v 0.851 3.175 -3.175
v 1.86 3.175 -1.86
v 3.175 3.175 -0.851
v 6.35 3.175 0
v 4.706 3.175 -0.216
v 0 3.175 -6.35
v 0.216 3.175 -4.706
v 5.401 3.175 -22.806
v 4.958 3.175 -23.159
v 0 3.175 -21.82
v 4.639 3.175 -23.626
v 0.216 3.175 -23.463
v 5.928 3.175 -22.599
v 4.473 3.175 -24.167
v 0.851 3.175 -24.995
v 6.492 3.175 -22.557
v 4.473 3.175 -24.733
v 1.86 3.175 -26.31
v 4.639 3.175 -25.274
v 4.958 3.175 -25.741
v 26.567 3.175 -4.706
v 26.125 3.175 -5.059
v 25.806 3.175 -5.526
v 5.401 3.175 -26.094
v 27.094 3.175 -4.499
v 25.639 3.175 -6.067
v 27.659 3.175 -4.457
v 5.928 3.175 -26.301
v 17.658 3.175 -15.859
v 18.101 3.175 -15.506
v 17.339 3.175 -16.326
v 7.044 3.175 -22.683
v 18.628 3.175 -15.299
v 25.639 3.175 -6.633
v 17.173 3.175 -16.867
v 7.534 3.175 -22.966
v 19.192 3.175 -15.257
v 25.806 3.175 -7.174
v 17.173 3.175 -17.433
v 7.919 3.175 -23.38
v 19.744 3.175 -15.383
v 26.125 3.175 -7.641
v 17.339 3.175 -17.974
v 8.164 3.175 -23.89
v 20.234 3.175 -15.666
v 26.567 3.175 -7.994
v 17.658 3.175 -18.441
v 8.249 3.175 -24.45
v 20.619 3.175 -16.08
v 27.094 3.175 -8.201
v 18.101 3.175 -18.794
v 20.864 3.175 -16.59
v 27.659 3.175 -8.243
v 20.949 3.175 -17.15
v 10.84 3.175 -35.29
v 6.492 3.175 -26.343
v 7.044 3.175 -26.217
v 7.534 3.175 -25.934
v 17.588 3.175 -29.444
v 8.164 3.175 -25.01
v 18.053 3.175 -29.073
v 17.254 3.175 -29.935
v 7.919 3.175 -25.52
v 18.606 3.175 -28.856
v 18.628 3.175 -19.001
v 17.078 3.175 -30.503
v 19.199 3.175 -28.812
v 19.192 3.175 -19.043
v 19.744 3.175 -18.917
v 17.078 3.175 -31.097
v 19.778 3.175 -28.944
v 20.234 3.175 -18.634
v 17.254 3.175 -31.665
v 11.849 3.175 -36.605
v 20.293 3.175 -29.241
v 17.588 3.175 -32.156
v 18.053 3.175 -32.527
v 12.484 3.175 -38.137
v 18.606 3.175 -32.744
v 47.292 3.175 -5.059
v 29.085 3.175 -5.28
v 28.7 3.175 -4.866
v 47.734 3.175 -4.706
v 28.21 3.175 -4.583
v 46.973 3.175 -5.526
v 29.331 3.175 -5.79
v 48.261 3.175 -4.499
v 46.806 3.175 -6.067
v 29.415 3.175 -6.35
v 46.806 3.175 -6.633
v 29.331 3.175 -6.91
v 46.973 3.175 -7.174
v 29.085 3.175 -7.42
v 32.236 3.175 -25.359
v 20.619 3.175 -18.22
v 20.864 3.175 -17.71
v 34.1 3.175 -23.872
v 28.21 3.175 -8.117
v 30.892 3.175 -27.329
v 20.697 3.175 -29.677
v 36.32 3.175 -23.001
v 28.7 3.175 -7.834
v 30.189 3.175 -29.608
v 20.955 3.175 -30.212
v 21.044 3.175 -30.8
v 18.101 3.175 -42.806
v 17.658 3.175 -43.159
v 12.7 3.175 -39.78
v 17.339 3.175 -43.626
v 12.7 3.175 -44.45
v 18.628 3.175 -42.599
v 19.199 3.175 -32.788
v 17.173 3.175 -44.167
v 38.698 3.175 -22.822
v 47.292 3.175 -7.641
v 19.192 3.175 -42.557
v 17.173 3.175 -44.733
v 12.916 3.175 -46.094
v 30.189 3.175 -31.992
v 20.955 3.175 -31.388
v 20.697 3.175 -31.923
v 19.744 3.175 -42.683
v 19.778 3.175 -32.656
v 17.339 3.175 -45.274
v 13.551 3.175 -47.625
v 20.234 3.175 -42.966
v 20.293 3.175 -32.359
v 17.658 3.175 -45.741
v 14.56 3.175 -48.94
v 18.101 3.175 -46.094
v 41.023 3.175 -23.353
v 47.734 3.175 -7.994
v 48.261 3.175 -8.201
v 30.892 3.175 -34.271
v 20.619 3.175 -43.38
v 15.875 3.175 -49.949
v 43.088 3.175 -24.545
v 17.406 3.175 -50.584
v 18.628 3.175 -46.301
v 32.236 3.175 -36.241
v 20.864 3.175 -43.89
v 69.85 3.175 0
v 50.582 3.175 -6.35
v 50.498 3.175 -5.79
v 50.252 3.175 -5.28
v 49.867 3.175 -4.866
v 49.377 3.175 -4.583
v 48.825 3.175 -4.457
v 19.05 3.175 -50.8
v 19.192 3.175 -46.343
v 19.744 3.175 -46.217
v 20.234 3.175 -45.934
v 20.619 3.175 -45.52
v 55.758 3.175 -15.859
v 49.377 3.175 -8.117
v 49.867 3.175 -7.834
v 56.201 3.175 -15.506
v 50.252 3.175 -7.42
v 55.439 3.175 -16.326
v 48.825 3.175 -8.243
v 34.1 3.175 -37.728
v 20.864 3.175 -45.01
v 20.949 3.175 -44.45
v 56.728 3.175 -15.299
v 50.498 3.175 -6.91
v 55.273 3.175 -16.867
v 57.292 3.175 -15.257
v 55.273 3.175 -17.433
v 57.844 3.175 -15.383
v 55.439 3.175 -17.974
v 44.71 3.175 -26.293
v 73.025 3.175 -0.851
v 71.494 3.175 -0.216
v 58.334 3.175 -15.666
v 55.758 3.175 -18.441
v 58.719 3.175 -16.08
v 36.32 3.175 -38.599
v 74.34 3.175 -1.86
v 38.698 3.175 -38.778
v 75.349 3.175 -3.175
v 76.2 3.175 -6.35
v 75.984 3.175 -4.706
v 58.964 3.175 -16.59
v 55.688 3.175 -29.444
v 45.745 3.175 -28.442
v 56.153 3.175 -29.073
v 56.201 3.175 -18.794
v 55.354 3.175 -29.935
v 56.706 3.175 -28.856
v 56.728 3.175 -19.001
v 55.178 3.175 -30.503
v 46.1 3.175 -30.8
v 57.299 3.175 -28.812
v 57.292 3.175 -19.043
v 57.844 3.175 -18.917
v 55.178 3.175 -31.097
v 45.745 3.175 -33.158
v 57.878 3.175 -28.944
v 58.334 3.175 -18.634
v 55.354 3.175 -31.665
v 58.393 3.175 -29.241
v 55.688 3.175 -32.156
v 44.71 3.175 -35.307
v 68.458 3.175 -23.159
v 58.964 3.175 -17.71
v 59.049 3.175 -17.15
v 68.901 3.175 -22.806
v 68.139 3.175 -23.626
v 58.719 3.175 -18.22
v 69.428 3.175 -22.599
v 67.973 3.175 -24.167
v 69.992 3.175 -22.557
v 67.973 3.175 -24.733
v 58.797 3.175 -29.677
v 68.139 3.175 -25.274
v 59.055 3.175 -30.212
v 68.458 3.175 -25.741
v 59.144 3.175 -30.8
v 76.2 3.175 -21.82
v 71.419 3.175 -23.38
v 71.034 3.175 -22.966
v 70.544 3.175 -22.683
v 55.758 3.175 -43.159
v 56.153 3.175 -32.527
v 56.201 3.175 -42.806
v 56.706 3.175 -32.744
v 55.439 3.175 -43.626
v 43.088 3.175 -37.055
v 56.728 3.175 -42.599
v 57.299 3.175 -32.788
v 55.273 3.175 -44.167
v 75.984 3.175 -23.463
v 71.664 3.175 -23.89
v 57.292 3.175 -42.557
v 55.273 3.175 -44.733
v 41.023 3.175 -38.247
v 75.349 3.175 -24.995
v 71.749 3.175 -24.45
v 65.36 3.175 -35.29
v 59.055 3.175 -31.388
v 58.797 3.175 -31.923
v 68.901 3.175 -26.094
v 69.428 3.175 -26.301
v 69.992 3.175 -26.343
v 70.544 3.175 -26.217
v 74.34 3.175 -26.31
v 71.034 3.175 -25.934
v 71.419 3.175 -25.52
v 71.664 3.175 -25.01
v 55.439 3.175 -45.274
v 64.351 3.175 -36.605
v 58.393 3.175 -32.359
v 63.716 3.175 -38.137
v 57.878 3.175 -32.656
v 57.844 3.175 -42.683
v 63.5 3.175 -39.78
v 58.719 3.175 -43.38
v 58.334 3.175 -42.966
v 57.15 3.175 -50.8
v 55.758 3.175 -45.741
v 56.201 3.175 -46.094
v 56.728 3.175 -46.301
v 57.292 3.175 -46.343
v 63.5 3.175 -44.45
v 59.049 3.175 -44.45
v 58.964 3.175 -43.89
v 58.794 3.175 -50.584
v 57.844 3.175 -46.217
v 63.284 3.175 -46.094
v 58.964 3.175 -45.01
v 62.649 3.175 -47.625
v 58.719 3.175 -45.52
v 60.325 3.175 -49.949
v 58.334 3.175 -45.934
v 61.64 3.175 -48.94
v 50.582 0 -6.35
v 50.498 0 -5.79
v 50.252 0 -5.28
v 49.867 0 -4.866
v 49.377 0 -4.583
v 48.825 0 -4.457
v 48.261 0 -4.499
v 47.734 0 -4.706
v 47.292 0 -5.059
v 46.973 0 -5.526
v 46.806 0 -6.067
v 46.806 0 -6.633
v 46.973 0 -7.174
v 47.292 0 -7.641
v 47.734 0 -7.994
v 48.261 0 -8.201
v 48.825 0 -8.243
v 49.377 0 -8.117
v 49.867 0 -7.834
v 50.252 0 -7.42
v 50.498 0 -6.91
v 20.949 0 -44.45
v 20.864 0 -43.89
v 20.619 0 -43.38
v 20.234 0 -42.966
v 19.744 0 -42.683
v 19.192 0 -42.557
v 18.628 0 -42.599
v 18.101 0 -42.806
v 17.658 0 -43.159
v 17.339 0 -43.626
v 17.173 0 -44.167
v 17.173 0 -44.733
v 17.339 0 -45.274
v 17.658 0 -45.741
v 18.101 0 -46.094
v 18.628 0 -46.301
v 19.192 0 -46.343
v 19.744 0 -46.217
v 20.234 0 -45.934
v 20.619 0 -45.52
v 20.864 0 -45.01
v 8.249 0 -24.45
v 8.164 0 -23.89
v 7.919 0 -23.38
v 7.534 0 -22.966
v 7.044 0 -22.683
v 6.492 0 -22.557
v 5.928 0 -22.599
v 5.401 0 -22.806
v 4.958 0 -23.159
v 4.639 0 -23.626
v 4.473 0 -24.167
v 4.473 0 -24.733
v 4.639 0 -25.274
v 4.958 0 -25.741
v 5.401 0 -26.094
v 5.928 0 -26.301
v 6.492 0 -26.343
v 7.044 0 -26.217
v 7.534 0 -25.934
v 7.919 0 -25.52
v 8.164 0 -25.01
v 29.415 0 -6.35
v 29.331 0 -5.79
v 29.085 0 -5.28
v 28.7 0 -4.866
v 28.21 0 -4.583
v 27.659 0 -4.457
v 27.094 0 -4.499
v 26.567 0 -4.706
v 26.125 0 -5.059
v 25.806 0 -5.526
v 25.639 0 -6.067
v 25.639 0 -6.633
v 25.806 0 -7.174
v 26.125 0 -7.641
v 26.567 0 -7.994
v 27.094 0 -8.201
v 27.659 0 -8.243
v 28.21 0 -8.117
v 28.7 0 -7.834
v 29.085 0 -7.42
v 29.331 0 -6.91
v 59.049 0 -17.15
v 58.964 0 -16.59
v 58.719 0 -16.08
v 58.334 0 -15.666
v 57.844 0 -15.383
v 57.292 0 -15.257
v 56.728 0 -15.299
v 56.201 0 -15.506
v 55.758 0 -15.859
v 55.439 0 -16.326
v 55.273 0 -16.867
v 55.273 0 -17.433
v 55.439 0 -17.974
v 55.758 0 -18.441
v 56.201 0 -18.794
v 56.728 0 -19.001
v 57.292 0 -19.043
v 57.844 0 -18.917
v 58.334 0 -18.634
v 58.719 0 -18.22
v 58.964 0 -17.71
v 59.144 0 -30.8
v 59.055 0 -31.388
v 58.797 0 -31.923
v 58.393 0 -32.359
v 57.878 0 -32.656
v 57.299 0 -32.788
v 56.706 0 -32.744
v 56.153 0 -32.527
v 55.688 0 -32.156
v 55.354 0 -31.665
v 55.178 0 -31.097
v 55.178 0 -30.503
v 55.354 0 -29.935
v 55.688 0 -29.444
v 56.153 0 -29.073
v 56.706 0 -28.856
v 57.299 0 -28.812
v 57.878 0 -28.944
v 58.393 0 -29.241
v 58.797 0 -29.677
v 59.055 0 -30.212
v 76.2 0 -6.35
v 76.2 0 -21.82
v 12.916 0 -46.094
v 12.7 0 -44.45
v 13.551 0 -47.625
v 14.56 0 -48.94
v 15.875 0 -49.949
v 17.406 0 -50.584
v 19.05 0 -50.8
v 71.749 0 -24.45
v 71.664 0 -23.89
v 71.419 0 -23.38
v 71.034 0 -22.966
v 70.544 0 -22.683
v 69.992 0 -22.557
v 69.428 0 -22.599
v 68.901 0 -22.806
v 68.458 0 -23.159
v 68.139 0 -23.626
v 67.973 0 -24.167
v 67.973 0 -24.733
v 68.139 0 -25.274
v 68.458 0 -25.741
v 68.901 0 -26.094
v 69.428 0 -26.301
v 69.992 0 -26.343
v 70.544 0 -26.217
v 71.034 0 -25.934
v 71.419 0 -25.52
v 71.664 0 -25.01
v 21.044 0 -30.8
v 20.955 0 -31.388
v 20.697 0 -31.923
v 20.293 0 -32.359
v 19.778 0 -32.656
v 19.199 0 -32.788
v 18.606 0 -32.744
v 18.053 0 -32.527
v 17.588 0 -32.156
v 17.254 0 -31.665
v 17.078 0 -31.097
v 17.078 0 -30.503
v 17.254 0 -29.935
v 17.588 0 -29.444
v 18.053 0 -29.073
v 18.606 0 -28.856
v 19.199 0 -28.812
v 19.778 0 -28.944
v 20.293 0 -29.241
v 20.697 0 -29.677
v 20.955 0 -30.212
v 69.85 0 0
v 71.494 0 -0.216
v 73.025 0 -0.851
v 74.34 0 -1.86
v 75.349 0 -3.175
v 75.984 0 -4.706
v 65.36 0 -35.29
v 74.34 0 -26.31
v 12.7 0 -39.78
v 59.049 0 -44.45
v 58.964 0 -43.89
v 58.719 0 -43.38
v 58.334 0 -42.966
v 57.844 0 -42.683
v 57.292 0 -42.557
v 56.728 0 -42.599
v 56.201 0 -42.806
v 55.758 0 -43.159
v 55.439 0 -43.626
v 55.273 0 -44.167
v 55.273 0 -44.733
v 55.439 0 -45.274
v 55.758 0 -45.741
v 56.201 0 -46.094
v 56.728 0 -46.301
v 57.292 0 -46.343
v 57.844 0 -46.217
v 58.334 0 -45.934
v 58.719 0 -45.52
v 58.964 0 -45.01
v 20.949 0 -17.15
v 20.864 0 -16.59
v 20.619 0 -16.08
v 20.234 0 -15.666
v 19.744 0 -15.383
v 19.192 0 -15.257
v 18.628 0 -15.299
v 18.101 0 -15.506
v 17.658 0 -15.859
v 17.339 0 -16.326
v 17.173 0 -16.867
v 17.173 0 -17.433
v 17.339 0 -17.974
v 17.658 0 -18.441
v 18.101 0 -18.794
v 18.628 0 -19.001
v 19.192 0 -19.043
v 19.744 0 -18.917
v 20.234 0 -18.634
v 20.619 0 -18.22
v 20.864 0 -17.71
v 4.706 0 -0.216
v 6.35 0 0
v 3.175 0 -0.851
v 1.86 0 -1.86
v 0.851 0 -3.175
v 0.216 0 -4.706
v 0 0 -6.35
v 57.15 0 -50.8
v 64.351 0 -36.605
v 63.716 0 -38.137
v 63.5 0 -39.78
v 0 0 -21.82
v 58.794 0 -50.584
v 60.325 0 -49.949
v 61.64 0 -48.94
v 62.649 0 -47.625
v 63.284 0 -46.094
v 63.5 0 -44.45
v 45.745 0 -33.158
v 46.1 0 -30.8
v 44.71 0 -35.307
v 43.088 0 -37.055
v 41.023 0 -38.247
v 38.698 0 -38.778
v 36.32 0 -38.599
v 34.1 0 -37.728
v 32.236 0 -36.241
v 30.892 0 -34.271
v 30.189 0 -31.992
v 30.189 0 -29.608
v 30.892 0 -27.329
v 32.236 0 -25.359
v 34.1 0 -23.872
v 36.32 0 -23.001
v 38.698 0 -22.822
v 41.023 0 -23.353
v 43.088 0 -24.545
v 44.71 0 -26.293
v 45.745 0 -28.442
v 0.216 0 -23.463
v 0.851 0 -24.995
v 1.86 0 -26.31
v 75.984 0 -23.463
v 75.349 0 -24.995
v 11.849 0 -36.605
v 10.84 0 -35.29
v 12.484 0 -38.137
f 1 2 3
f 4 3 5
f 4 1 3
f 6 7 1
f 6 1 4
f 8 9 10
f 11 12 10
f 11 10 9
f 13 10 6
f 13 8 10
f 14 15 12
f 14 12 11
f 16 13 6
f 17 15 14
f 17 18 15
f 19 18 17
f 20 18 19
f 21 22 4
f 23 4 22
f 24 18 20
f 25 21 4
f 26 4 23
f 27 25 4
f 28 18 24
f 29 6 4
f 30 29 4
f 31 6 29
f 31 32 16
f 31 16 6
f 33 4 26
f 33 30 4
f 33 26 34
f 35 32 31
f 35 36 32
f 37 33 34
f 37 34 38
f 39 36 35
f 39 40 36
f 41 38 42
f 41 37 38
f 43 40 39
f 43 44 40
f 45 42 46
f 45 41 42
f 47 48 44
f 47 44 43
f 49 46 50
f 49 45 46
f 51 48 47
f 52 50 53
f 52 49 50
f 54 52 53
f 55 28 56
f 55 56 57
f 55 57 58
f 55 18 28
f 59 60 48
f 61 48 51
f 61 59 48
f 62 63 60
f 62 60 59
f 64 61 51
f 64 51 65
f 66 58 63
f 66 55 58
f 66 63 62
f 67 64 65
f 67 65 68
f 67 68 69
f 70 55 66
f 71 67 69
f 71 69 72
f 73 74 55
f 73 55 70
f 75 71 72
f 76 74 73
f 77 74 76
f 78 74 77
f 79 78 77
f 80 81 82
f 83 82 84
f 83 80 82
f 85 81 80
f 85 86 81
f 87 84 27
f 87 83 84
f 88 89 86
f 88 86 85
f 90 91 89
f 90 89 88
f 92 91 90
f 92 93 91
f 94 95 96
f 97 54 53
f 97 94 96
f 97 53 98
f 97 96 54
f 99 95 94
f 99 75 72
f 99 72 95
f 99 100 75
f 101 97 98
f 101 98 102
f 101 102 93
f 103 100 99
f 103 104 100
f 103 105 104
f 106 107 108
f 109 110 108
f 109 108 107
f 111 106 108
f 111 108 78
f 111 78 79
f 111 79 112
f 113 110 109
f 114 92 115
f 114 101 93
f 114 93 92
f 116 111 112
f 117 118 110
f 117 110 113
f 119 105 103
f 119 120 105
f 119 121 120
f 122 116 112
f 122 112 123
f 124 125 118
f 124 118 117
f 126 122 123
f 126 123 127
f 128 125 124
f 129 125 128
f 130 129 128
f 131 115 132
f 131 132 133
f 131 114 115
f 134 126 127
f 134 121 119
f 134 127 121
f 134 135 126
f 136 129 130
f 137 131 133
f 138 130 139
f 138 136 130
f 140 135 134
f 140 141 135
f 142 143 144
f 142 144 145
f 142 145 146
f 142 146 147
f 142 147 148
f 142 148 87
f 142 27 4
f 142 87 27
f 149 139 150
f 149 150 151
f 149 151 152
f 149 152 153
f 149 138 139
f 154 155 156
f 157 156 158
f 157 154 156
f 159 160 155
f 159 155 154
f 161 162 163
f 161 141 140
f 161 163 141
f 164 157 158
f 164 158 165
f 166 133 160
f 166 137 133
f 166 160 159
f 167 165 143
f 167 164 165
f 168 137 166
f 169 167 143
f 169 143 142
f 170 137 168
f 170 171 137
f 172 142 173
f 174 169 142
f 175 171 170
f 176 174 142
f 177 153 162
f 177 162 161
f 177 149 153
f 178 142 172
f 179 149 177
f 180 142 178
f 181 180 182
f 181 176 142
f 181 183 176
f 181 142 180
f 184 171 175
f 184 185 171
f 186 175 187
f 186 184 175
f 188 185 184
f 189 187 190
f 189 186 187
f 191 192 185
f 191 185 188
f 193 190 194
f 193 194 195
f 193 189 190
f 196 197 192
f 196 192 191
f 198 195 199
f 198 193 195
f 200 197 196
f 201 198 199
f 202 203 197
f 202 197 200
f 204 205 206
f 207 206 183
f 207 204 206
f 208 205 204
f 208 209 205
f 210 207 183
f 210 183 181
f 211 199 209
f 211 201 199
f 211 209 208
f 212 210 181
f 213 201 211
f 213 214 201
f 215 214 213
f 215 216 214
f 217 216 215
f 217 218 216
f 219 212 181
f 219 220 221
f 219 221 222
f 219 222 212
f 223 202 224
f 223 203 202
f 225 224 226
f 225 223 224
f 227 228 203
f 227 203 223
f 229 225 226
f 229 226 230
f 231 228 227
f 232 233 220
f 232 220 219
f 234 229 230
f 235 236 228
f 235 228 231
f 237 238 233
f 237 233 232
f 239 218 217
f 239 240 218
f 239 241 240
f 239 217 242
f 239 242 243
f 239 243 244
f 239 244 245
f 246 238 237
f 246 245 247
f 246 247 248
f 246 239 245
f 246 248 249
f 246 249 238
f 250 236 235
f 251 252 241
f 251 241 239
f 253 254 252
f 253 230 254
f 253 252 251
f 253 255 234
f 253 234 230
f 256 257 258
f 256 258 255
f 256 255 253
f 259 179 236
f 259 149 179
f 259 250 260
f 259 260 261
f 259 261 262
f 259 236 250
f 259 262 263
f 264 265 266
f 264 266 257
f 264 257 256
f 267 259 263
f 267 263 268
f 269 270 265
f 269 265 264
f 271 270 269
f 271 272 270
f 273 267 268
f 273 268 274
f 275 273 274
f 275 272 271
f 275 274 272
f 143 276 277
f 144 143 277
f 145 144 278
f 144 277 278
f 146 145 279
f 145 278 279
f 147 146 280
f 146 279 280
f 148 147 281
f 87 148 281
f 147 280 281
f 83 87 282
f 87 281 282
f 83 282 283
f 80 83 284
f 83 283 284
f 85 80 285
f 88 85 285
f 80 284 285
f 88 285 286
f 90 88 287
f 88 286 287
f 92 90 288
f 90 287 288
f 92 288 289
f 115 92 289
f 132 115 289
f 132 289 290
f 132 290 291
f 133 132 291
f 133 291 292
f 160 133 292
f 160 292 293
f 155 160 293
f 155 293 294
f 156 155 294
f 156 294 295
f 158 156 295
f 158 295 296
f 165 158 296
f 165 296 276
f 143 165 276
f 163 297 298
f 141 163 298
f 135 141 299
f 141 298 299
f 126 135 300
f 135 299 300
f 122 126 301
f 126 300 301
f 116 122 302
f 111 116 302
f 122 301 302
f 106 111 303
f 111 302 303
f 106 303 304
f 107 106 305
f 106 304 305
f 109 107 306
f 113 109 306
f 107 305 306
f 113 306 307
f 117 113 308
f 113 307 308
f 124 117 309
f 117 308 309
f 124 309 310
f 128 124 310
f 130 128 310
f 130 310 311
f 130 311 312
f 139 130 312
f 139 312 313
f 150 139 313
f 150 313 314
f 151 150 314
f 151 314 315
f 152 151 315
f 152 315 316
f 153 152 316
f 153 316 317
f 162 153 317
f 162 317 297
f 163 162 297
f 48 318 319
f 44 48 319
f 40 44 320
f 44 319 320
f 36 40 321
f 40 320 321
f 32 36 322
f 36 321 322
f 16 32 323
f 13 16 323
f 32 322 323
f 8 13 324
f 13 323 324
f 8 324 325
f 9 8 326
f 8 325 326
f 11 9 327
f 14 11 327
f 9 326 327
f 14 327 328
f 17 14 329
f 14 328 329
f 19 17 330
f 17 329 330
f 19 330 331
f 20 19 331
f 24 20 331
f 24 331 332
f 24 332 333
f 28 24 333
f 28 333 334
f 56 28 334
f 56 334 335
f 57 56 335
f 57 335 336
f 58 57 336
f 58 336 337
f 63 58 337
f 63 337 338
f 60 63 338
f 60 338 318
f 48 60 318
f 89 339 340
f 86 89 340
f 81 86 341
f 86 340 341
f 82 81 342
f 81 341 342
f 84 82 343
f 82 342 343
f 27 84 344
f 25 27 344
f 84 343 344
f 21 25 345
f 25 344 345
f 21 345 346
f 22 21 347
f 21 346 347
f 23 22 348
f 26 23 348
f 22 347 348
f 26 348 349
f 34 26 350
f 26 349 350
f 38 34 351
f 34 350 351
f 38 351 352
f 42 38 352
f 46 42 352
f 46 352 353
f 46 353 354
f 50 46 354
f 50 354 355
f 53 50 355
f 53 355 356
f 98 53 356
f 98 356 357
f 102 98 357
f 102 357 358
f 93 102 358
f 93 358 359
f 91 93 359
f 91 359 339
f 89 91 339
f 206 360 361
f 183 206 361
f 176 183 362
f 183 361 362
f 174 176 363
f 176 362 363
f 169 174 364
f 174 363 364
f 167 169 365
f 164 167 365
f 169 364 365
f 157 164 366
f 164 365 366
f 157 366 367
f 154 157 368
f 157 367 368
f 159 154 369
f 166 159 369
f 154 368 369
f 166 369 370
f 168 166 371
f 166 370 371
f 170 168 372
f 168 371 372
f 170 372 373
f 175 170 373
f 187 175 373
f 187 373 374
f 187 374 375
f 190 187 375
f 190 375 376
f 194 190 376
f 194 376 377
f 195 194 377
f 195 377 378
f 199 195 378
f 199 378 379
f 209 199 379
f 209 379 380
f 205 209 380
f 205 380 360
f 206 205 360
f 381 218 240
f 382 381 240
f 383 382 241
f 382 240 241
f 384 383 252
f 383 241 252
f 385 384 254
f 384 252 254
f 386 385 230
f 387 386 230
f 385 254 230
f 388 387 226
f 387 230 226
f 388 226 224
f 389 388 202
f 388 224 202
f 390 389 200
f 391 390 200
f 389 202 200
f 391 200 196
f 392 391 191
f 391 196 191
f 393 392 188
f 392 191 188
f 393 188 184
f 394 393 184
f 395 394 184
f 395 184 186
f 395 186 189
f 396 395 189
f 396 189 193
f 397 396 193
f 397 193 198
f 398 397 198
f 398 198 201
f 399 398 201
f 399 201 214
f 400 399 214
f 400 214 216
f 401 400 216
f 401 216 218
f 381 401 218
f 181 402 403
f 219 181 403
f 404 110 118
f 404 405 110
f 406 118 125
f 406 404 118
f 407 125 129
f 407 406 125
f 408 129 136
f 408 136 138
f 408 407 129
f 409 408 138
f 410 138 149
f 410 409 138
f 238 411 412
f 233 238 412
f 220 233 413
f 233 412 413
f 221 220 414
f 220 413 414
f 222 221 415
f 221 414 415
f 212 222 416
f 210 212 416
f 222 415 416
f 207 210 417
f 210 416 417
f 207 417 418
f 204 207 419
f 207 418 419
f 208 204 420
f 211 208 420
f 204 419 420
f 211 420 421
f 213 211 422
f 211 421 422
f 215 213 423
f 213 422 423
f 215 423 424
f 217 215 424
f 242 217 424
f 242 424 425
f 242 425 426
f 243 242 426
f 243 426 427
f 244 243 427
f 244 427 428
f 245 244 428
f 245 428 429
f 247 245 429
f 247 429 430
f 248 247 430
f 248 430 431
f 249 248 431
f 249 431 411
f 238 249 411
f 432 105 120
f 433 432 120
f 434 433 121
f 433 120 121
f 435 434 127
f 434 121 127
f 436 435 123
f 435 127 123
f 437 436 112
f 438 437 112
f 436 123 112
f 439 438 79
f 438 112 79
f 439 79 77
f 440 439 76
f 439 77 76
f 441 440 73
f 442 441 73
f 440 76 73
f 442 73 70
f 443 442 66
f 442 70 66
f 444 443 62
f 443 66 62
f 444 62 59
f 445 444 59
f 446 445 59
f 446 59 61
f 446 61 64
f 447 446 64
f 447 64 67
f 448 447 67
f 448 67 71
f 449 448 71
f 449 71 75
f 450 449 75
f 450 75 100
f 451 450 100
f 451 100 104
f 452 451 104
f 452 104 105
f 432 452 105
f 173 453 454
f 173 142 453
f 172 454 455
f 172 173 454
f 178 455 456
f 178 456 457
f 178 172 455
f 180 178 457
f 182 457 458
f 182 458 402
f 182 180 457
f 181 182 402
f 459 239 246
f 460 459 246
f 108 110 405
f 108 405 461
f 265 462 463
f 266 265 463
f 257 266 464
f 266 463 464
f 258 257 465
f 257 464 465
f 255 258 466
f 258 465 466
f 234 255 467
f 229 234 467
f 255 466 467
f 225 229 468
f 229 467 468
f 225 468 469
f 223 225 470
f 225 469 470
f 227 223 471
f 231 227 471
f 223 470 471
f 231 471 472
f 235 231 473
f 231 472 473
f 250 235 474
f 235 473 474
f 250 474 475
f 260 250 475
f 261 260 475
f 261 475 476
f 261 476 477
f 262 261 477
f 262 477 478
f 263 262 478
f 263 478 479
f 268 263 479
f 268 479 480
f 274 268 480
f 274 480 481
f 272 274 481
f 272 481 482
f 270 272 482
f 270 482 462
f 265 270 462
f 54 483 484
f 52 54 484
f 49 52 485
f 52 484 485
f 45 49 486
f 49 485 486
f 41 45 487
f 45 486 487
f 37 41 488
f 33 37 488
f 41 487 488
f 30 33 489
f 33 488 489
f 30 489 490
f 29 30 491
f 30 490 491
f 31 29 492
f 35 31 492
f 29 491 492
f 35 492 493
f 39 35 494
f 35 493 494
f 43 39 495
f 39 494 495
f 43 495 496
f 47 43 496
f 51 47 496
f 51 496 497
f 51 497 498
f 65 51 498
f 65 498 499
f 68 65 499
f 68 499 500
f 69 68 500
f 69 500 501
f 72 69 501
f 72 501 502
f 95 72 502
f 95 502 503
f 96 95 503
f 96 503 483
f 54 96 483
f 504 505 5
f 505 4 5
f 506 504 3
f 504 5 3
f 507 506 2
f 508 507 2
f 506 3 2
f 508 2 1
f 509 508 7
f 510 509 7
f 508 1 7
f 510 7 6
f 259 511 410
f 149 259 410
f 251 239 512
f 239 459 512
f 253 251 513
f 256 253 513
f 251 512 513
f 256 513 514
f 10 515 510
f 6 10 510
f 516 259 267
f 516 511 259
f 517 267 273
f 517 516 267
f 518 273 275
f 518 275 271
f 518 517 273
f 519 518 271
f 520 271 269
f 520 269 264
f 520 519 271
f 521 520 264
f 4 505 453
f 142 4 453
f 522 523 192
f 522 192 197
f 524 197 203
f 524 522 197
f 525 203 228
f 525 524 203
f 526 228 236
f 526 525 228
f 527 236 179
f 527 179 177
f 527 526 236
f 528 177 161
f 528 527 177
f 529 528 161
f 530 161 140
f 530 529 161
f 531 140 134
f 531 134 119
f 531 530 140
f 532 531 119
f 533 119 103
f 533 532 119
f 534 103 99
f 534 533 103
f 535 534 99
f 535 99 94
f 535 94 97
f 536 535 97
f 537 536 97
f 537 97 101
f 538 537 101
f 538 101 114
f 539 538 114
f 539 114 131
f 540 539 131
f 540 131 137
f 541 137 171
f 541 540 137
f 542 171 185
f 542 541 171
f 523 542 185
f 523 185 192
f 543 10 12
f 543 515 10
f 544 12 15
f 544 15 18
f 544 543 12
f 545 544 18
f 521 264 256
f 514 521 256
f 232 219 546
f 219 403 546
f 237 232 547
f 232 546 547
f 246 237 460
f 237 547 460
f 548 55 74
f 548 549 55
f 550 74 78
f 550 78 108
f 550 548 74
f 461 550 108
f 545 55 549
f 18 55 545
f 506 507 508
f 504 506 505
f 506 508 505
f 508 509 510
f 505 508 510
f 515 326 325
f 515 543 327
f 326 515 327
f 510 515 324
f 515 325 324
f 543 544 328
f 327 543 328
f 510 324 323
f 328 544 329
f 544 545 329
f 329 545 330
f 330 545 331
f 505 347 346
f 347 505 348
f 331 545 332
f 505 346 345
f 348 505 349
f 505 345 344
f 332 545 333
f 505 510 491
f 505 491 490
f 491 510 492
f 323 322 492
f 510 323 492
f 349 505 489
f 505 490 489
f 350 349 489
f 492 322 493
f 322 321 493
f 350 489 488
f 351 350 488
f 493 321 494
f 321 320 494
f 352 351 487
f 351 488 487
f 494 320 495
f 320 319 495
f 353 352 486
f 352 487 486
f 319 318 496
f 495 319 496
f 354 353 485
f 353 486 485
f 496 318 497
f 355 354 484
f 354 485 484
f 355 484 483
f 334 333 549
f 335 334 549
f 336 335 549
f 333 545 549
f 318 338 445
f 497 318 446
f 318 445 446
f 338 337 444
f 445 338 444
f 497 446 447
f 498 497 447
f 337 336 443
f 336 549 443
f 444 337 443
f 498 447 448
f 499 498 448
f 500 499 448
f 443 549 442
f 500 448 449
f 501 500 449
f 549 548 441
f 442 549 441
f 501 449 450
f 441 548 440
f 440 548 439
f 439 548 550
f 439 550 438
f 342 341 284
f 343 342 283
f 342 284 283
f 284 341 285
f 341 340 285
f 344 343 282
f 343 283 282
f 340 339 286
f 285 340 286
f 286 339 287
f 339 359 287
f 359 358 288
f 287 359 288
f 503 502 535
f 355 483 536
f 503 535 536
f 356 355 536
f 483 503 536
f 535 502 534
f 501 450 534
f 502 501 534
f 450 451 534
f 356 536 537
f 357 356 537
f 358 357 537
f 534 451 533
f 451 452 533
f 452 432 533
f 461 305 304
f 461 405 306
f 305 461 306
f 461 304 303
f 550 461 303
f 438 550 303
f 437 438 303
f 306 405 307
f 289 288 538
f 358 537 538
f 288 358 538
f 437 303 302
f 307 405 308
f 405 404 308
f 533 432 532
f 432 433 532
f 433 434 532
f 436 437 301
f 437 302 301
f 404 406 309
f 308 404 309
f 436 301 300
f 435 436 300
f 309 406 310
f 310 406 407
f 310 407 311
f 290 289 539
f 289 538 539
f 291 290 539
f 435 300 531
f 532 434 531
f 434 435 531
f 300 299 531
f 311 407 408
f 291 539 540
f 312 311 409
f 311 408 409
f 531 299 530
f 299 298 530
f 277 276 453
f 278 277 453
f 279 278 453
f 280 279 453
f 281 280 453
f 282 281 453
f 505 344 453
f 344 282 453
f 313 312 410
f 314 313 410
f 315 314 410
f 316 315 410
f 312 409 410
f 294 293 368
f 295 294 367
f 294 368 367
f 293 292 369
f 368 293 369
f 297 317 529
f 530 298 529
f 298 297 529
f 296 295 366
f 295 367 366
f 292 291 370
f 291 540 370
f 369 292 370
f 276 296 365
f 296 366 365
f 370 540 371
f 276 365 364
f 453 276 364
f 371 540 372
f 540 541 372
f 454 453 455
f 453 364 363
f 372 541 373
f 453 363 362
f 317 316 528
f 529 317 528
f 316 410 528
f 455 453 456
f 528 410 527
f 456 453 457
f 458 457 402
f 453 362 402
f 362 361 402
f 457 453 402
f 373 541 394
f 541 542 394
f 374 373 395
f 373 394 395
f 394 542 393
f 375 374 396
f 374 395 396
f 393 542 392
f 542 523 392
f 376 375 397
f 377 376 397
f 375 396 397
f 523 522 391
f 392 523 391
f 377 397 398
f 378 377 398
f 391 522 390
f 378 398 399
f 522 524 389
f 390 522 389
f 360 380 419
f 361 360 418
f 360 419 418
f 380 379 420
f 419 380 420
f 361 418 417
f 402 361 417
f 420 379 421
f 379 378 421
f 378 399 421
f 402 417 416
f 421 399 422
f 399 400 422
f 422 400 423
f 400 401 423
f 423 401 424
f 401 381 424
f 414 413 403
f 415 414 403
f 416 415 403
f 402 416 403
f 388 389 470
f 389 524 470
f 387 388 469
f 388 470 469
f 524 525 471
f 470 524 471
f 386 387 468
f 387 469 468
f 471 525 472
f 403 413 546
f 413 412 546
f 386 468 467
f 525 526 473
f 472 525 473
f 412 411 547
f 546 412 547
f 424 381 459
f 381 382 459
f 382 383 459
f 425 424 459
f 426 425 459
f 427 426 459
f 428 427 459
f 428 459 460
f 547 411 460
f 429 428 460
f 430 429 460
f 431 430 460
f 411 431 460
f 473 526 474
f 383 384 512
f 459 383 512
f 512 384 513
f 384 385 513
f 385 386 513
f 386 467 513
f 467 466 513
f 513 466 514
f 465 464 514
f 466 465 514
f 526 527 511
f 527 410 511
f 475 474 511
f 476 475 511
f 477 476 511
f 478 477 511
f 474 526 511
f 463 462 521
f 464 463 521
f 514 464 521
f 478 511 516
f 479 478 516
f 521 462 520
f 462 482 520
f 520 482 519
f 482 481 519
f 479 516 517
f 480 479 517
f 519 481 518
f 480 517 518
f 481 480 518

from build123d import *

# Parameters (mm, degrees)
SKETCH1_R           = 8
BOSS_EXTRUDE1_DEPTH = 3.175
SKETCH2_R           = 1.9939
CUT_EXTRUDE1_DEPTH  = 4.175
SKETCH14_R          = 1.89865
M3_TAP_DEPTH        = 4.175
SKETCH15_R          = 1.89865
M5_THROUGH_DEPTH    = 4.175
CUT_EXTRUDE2_DEPTH  = 4.175
FILLET2_R           = 6.35


with BuildPart() as part:
    # Sketch1 → Boss-Extrude1 (new body)
    with BuildSketch(Plane(origin=(0, 0, 0), x_dir=(1, 0, 0), z_dir=(0, 1, 0))):
        Polygon((0, 0), (76.2, 0), (76.2, 50.8), (38.1, 50.8), (0, 50.8), align=None)
        with Locations((38.1, 30.8)):
            Circle(SKETCH1_R, mode=Mode.SUBTRACT)
    extrude(amount=BOSS_EXTRUDE1_DEPTH)

    # Sketch2 → Cut-Extrude1 (cut, through all)
    with BuildSketch(Plane(origin=(0, 3.175, 0), x_dir=(1, 0, 0), z_dir=(0, 1, 0))):
        with Locations((19.05, 30.8)):
            Circle(SKETCH2_R)
        with Locations((57.15, 30.8)):
            Circle(SKETCH2_R)
    extrude(amount=-CUT_EXTRUDE1_DEPTH, mode=Mode.SUBTRACT)

    # Sketch14 → M3-tap (cut, through all)
    with BuildSketch(Plane.XZ):
        with Locations((57.15, -44.45)):
            Circle(SKETCH14_R)
        with Locations((19.05, -44.45)):
            Circle(SKETCH14_R)
        with Locations((19.05, -17.15)):
            Circle(SKETCH14_R)
        with Locations((57.15, -17.15)):
            Circle(SKETCH14_R)
    extrude(amount=-M3_TAP_DEPTH, mode=Mode.SUBTRACT)

    # Sketch15 → M5-through (cut, through all)
    with BuildSketch(Plane.XZ):
        with Locations((69.85, -24.45004)):
            Circle(SKETCH15_R)
        with Locations((48.683333333, -6.35)):
            Circle(SKETCH15_R)
        with Locations((27.516666667, -6.35)):
            Circle(SKETCH15_R)
        with Locations((6.35, -24.45004)):
            Circle(SKETCH15_R)
    extrude(amount=-M5_THROUGH_DEPTH, mode=Mode.SUBTRACT)

    # Sketch12 → Cut-Extrude2 (cut, through all)
    with BuildSketch(Plane(origin=(0, 3.175, 0), x_dir=(1, 0, 0), z_dir=(0, 1, 0))):
        Polygon((0, 50.8), (12.7, 50.8), (12.7, 37.15), (0, 24.45), align=None)
        Polygon((63.5, 50.8), (63.5, 37.15), (76.2, 24.45), (76.2, 50.8), align=None)
    extrude(amount=-CUT_EXTRUDE2_DEPTH, mode=Mode.SUBTRACT)

    # Fillet2
    fillet2_edges = [part.edges().sort_by_distance(p)[0] for p in [
        (0, 1.5875, -24.45),
        (12.7, 1.5875, -50.8),
        (12.7, 1.5875, -37.15),
        (63.5, 1.5875, -50.8),
        (76.2, 1.5875, -24.45),
        (63.5, 1.5875, -37.15),
        (76.2, 1.5875, 0),
        (0, 1.5875, 0),
    ]]
    fillet(fillet2_edges, radius=FILLET2_R)


solid = part.part
